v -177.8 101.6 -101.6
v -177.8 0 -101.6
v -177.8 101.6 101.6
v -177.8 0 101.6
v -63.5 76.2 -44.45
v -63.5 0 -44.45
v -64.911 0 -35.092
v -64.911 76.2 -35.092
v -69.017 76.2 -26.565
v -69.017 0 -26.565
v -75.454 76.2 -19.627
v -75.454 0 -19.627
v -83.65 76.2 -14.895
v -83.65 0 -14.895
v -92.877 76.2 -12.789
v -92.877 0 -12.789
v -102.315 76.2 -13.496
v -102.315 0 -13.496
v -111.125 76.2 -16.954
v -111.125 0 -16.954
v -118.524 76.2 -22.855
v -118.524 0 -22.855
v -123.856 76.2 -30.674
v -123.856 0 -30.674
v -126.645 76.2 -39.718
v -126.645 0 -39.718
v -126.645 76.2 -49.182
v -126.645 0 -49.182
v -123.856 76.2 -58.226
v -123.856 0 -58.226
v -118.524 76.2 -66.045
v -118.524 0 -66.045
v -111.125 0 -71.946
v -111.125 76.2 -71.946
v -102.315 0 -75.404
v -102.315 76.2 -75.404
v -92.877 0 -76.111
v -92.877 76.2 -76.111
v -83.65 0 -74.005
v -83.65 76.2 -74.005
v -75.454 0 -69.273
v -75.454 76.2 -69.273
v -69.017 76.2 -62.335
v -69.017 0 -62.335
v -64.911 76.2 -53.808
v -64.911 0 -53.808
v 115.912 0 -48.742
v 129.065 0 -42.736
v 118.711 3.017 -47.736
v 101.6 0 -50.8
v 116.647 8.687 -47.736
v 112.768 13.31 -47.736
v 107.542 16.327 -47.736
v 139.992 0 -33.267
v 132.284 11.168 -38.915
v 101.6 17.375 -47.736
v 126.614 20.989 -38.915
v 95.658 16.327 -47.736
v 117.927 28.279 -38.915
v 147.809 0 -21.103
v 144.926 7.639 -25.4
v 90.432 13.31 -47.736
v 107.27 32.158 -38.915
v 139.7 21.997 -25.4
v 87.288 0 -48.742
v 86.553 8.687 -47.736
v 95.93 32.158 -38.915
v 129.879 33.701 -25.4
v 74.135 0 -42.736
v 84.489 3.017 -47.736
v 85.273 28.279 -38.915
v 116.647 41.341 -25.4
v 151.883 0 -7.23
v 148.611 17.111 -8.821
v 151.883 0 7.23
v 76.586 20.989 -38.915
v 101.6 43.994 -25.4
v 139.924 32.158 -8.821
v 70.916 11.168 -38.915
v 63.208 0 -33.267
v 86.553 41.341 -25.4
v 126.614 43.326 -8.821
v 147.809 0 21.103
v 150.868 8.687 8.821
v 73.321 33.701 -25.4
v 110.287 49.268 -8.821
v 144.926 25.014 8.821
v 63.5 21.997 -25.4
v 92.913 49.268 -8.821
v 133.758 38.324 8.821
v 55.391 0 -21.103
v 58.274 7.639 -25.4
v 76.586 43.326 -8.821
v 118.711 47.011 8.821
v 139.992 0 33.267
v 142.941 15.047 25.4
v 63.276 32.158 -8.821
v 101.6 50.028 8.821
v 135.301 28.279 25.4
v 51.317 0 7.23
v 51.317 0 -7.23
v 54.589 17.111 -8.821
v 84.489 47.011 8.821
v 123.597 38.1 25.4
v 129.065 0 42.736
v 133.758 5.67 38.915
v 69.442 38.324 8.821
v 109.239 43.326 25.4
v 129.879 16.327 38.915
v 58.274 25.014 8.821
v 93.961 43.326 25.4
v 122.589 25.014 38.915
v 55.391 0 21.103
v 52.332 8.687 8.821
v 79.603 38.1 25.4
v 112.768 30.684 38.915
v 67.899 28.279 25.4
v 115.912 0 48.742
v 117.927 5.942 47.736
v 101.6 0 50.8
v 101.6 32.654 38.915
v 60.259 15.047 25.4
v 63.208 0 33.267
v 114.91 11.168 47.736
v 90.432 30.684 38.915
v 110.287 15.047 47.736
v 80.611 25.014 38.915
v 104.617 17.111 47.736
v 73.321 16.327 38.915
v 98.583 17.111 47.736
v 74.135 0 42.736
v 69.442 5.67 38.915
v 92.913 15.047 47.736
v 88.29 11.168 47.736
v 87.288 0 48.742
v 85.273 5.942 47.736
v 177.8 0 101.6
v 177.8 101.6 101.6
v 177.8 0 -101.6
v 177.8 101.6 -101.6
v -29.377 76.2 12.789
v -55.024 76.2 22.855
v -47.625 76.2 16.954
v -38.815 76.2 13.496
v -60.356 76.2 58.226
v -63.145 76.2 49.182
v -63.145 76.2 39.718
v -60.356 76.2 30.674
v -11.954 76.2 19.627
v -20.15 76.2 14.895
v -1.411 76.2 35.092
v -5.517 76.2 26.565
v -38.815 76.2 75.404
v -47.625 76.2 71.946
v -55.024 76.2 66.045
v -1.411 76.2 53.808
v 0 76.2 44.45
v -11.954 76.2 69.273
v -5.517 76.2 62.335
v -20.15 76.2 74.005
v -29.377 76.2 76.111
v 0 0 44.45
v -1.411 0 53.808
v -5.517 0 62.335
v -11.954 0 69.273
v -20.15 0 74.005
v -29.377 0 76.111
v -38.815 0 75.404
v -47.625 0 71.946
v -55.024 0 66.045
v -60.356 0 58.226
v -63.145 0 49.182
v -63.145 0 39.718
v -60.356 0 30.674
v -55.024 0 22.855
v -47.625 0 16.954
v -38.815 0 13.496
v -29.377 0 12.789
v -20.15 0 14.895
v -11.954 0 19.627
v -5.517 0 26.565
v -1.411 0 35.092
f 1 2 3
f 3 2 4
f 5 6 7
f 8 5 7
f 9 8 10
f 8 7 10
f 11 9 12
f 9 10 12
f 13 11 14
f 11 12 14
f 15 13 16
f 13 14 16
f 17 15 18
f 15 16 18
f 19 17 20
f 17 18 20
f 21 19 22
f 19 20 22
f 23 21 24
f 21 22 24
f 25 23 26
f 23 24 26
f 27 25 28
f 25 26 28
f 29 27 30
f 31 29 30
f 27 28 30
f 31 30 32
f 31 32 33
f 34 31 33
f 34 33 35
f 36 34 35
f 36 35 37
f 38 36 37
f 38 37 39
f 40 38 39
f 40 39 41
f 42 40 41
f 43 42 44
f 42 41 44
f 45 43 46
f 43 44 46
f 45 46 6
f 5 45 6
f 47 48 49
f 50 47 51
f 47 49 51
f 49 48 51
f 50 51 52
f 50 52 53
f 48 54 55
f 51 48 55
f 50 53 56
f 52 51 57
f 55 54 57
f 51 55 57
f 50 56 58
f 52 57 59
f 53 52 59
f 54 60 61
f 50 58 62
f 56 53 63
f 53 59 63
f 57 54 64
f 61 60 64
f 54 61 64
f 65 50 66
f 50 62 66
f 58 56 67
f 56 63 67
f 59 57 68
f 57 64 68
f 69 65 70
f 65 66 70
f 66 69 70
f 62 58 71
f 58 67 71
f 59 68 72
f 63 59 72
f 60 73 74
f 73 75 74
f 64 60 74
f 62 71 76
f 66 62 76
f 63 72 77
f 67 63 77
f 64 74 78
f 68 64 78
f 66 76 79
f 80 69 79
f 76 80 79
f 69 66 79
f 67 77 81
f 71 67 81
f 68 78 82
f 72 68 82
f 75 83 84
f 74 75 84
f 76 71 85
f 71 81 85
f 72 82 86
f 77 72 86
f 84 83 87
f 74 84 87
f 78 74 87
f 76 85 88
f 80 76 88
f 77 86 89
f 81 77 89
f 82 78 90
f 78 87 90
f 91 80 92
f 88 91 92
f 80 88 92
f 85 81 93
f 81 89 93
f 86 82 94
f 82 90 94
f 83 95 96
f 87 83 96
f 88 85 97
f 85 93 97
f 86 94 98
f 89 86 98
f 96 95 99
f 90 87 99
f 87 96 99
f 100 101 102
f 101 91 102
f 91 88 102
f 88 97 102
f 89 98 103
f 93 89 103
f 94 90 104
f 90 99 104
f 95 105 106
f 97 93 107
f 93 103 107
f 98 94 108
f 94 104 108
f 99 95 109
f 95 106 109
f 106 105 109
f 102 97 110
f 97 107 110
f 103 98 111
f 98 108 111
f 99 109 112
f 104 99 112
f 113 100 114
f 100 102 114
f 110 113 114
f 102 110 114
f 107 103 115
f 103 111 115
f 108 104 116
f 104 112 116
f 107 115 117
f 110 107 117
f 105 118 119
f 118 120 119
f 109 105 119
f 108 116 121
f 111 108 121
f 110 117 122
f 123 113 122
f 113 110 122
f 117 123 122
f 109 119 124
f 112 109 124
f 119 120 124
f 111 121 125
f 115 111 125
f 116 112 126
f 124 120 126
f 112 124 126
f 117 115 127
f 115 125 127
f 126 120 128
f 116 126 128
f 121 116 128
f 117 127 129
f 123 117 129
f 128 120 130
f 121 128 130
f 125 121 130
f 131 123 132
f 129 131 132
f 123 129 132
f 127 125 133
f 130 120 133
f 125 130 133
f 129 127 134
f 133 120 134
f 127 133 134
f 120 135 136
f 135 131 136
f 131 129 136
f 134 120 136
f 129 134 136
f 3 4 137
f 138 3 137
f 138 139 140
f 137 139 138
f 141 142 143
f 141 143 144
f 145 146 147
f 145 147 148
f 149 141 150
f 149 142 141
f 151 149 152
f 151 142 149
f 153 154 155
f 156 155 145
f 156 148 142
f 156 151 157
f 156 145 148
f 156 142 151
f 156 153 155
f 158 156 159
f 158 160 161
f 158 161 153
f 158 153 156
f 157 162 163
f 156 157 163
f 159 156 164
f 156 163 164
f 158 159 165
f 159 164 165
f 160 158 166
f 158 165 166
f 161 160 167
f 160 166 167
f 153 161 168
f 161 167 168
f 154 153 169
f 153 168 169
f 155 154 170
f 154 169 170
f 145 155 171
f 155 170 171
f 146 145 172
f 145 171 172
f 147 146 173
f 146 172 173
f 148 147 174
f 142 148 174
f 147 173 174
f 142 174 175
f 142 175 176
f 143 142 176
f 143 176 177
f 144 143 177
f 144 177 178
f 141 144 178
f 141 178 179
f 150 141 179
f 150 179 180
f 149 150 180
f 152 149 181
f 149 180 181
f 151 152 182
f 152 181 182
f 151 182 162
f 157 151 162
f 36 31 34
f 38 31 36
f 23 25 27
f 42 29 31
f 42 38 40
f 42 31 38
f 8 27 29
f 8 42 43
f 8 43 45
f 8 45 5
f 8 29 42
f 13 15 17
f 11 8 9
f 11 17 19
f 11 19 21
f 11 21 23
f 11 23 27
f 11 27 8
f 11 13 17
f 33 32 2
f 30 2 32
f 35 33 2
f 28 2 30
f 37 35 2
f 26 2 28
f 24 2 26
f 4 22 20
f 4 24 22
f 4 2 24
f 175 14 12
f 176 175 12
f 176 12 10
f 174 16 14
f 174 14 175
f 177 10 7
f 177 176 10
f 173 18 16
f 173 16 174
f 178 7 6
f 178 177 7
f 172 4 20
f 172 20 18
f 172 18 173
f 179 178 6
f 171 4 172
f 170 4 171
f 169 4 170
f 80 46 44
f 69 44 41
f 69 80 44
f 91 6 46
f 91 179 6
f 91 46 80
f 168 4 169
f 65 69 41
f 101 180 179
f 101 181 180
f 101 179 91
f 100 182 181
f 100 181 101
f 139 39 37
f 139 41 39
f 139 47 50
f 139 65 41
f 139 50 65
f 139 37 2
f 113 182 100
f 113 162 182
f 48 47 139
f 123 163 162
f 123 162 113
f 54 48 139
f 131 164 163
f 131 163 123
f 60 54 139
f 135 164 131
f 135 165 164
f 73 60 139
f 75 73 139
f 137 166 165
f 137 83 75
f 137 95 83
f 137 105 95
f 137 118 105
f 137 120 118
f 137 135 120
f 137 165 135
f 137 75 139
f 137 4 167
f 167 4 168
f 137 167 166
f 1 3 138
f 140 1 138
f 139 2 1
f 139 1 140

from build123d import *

# Parameters (mm, degrees)
F0_W     = 355.6
F0_H     = 203.2
F0_R     = 31.75
F1_DEPTH = 101.6
F3_DEPTH = 76.2


with BuildPart() as f1:
    # F0 (on Front) → F1 (new body)
    with BuildSketch(Plane.XZ):
        Rectangle(F0_W, F0_H)
        with Locations((-95.25, -44.45)):
            Circle(F0_R, mode=Mode.SUBTRACT)
        with BuildLine():
            ThreePointArc((101.6, 50.8), (152.4, 0), (101.6, -50.8))
            Line((101.6, -50.8), (101.6, 0))
            Line((101.6, 0), (101.6, 50.8))
        make_face(mode=Mode.SUBTRACT)
        with Locations((-31.75, 44.45)):
            Circle(F0_R, mode=Mode.SUBTRACT)
        with BuildLine():
            Line((101.6, 0), (101.6, -50.8))
            ThreePointArc((101.6, -50.8), (152.4, 0), (101.6, 50.8))
            Line((101.6, 50.8), (101.6, 0))
        make_face()
        with Locations((-31.75, 44.45)):
            Circle(F0_R)
        with Locations((-95.25, -44.45)):
            Circle(F0_R)
    extrude(amount=-F1_DEPTH)

    # F0 (on Front) → F2 (revolve, cut)
    with BuildSketch(Plane.XZ):
        with BuildLine():
            Line((101.6, 0), (101.6, -50.8))
            ThreePointArc((101.6, -50.8), (152.4, 0), (101.6, 50.8))
            Line((101.6, 50.8), (101.6, 0))
        make_face()
    revolve(axis=Axis((101.6, 0, 0), (0, 0, 1)), mode=Mode.SUBTRACT)

    # F0 (on Front) → F3 (cut)
    with BuildSketch(Plane.XZ):
        with Locations((-31.75, 44.45)):
            Circle(F0_R)
        with Locations((-95.25, -44.45)):
            Circle(F0_R)
    extrude(amount=-F3_DEPTH, mode=Mode.SUBTRACT)


solid = f1.part
